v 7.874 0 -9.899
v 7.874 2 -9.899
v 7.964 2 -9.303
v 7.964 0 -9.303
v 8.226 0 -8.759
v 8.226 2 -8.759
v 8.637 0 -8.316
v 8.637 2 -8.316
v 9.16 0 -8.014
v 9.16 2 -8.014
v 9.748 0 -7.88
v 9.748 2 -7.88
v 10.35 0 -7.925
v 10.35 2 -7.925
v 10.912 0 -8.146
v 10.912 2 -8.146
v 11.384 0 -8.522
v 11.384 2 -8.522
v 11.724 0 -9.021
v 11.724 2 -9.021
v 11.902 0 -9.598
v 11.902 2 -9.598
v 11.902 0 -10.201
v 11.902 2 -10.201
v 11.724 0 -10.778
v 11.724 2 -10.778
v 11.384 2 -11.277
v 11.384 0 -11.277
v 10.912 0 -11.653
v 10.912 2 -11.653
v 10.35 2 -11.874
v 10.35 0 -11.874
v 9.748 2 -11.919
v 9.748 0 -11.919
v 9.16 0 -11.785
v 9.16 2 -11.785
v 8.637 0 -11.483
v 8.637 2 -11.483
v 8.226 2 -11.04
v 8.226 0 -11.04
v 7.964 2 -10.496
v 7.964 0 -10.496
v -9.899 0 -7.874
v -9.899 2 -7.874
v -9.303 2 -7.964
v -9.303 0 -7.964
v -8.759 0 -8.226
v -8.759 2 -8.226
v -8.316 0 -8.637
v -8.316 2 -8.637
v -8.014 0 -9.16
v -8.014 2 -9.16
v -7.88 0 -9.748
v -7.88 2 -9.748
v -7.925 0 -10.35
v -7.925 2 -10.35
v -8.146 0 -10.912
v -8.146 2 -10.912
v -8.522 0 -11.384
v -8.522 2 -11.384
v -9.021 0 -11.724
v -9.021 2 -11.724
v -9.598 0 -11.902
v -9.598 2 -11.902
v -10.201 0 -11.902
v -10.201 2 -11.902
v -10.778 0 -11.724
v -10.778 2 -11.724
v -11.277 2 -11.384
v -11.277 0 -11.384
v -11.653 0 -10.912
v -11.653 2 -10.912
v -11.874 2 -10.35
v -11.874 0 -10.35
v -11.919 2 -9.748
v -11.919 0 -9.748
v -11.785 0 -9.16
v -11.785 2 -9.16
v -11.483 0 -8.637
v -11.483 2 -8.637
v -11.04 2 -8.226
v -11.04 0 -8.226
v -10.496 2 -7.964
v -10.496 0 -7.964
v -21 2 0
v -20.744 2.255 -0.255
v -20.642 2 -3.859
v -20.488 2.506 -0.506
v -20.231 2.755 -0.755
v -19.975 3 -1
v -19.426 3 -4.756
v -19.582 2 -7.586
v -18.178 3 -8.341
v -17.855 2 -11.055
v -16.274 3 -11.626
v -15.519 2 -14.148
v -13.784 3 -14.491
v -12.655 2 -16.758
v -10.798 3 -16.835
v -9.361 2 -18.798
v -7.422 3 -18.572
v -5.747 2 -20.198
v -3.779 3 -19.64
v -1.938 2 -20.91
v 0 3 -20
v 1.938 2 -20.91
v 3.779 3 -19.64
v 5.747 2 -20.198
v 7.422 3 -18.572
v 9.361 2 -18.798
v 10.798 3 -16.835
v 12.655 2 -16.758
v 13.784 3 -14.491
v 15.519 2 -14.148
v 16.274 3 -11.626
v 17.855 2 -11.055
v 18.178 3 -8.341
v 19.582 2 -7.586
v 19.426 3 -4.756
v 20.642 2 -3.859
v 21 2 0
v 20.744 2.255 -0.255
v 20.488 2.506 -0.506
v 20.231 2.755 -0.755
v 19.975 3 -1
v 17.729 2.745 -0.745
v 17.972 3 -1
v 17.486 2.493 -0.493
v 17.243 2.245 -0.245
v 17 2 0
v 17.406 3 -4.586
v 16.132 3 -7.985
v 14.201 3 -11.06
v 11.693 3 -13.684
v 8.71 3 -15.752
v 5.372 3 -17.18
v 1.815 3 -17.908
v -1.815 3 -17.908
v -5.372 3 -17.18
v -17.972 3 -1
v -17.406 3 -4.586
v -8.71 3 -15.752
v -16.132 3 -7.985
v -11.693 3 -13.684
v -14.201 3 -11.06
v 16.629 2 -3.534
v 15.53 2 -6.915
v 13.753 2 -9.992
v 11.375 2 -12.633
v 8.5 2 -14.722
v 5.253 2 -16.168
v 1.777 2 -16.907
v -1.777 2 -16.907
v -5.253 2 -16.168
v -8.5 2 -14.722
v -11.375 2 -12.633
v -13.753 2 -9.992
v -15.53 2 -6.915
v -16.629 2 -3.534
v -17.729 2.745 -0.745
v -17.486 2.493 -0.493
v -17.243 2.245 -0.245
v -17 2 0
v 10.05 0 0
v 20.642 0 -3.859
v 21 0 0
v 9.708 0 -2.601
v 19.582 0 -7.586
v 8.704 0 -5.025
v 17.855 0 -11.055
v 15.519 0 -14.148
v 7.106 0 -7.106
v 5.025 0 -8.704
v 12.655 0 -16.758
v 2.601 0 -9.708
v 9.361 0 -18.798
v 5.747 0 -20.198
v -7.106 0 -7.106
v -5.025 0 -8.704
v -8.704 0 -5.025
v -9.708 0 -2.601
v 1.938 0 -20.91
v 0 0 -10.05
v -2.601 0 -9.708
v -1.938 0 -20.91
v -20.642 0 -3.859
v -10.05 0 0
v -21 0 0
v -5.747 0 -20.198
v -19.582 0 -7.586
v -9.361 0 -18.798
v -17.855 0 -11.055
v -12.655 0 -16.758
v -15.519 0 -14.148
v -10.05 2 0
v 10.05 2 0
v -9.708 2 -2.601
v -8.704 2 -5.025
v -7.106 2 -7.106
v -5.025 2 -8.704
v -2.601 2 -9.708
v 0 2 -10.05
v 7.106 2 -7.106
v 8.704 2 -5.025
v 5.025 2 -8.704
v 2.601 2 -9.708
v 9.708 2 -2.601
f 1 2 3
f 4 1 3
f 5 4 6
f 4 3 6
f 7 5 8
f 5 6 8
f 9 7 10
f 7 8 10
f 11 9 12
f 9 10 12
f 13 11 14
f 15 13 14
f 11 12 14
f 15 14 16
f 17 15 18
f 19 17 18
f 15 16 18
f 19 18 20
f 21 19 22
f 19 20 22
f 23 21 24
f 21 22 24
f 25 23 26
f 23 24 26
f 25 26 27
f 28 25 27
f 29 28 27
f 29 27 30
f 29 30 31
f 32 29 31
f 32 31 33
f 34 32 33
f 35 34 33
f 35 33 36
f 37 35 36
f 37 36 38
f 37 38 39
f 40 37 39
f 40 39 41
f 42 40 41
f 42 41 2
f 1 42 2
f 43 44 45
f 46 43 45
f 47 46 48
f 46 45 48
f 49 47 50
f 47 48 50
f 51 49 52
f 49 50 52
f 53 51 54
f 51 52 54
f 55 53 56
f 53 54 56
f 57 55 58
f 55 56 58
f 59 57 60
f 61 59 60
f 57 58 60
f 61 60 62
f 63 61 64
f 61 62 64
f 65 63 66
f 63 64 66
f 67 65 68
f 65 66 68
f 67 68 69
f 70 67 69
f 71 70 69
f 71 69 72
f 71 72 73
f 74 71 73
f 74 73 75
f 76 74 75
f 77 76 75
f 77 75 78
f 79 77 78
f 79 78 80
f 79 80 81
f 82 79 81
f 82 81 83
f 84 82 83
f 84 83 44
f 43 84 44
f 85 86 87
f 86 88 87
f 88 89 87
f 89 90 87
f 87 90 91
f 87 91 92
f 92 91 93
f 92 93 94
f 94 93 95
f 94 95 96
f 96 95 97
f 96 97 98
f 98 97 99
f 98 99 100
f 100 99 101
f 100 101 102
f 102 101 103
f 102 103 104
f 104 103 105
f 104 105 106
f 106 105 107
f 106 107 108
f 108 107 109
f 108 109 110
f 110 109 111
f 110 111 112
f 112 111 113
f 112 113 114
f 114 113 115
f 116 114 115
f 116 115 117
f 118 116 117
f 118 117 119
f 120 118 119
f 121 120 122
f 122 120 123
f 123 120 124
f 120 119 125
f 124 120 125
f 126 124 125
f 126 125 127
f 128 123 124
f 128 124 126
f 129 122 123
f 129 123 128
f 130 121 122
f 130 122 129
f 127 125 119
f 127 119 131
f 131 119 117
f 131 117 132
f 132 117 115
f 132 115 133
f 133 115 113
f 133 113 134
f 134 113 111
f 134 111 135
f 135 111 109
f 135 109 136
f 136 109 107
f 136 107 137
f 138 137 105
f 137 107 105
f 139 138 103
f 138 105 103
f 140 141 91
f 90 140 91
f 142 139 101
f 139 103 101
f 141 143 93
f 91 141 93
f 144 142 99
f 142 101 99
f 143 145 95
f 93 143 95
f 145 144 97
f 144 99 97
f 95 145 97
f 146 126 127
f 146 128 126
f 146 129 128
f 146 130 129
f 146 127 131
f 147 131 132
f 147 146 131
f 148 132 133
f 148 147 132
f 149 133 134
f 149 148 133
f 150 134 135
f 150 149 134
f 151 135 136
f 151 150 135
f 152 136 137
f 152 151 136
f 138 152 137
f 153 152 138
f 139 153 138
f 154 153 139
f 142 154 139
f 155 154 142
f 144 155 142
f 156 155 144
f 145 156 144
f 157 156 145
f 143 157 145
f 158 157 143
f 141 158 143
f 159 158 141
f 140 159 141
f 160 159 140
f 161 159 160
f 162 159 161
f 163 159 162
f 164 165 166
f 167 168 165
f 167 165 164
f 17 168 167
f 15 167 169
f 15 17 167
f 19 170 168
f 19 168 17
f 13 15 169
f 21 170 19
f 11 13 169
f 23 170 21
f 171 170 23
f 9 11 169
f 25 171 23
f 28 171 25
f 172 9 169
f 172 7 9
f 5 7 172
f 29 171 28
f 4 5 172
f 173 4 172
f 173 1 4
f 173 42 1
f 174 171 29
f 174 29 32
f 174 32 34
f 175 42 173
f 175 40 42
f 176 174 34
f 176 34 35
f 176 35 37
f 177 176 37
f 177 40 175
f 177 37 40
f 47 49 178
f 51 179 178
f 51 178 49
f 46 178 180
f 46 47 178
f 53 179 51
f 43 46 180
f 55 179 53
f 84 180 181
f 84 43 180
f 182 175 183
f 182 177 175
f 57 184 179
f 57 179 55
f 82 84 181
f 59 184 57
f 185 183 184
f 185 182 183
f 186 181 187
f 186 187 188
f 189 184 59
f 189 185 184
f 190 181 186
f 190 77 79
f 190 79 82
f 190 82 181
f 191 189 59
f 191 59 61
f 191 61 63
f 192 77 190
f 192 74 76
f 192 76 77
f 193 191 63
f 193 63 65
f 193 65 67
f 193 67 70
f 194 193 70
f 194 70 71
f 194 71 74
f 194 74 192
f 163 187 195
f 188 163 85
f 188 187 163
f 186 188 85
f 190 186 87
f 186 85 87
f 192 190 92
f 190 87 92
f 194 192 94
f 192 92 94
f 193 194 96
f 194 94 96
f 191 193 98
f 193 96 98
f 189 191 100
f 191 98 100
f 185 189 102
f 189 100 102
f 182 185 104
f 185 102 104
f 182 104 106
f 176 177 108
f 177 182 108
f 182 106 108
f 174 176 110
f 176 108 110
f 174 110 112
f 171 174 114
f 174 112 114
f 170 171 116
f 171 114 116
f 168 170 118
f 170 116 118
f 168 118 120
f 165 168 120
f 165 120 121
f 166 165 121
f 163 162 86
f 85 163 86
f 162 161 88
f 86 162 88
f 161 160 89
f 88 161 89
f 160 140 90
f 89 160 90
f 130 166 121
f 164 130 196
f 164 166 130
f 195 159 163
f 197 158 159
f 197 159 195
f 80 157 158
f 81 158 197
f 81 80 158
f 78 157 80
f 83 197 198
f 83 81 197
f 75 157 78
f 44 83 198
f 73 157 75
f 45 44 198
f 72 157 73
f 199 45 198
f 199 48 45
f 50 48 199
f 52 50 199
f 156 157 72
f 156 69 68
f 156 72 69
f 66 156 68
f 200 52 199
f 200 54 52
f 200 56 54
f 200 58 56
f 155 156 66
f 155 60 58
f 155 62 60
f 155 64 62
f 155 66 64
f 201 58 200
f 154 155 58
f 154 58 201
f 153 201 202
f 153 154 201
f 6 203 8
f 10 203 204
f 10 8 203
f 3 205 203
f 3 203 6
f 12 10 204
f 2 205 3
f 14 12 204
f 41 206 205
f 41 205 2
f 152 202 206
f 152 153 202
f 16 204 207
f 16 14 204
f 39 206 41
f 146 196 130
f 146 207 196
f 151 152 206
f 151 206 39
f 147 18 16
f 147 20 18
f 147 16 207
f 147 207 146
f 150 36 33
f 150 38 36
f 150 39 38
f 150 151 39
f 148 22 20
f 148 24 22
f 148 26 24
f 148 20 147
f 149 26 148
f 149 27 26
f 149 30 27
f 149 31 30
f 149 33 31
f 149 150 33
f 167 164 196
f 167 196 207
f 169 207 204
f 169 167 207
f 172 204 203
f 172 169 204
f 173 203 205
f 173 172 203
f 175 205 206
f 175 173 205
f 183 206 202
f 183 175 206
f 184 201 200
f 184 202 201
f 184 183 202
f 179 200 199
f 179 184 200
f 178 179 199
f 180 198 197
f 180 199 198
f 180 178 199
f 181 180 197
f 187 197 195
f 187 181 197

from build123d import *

# Parameters (mm, degrees)
EXTRUDE_1_DEPTH               = 3
HOLE_WIZARD_M2_1_AT_2_COUNT   = 2
HOLE_WIZARD_M2_1_AT_2_PITCH   = 21
PATTERN_LINEAR_1_COUNT        = 3
PATTERN_LINEAR_1_PITCH        = 33
PATTERN_LINEAR_2_COUNT        = 3
PATTERN_LINEAR_2_PITCH        = 10.5
PATTERN_LINEAR_3_COUNT        = 2
PATTERN_LINEAR_3_PITCH        = 31.5
HOLE_WIZARD_M2_1_2_AT_2_COUNT = 2
HOLE_WIZARD_M2_1_2_AT_2_PITCH = 16.970562748
SKETCH_8_R                    = 17
CUT_EXTRUDE_1_DEPTH           = 1
SKETCH_9_R                    = 2.025
CUT_EXTRUDE_2_DEPTH           = 75.994999833
PATTERN_CIRCULAR_1_COUNT      = 2
PATTERN_CIRCULAR_1_ANGLE      = 90
FILLET_1_R                    = 4
CUT_EXTRUDE_3_DEPTH           = 76.028327984
CHAMFER_2_SIZE                = 1


with BuildPart() as part:
    # ｽｹｯﾁ1 → ﾎﾞｽ - 押し出し1 (new body)
    with BuildSketch(Plane(origin=(0, 0, 0), x_dir=(1, 0, 0), z_dir=(0, 1, 0))):
        with BuildLine():
            Line((-10.05, 0), (-39, 0))
            Line((-39, 0), (-47.5, 8.5))
            Line((-47.5, 8.5), (-47.5, 58))
            Line((-47.5, 58), (47.5, 58))
            Line((47.5, 58), (47.5, 8.5))
            Line((47.5, 8.5), (39, 0))
            Line((39, 0), (10.05, 0))
            ThreePointArc((10.05, 0), (0, 10.05), (-10.05, 0))
        make_face()
    extrude(amount=EXTRUDE_1_DEPTH)

    # ｽｹｯﾁ3 → Hole Wizard M2 _1 (revolve, cut)
    with BuildSketch(Plane(origin=(-43.5, 3, -54), x_dir=(0, 0, 1), z_dir=(1, 0, 0))):
        Polygon((0, 0), (0, 4.63090365), (1.05, 4), (1.05, 1), (2, 1), (2, 0), align=None)
    hole_wizard_m2_1 = revolve(axis=Axis((-43.5, 9.35, -54), (0, -1, 0)), mode=Mode.SUBTRACT)

    # Hole Wizard M2 _1 at 2: Hole Wizard M2 _1 ×2
    with Locations(*[(i * HOLE_WIZARD_M2_1_AT_2_PITCH, 0, 0) for i in range(1, HOLE_WIZARD_M2_1_AT_2_COUNT)]):
        add(hole_wizard_m2_1, mode=Mode.SUBTRACT)

    # 直線ﾊﾟﾀｰﾝ1: Hole Wizard M2 _1 ×3
    with Locations(*[(i * PATTERN_LINEAR_1_PITCH, 0, 0) for i in range(1, PATTERN_LINEAR_1_COUNT)]):
        add(hole_wizard_m2_1, mode=Mode.SUBTRACT)

    # 直線ﾊﾟﾀｰﾝ1 copy 1 sketch → 直線ﾊﾟﾀｰﾝ1 copy 1 (revolve, cut)
    with BuildSketch(Plane(origin=(10.5, 3, -54), x_dir=(0, 0, 1), z_dir=(1, 0, 0))):
        Polygon((0, 0), (0, 4.63090365), (1.05, 4), (1.05, 1), (2, 1), (2, 0), align=None)
    revolve(axis=Axis((10.5, 9.35, -54), (0, -1, 0)), mode=Mode.SUBTRACT)

    # 直線ﾊﾟﾀｰﾝ1 copy 2 sketch → 直線ﾊﾟﾀｰﾝ1 copy 2 (revolve, cut)
    with BuildSketch(Plane(origin=(43.5, 3, -54), x_dir=(0, 0, 1), z_dir=(1, 0, 0))):
        Polygon((0, 0), (0, 4.63090365), (1.05, 4), (1.05, 1), (2, 1), (2, 0), align=None)
    revolve(axis=Axis((43.5, 9.35, -54), (0, -1, 0)), mode=Mode.SUBTRACT)

    # 直線ﾊﾟﾀｰﾝ2: Hole Wizard M2 _1 ×3
    with Locations(*[(0, 0, i * PATTERN_LINEAR_2_PITCH) for i in range(1, PATTERN_LINEAR_2_COUNT)]):
        add(hole_wizard_m2_1, mode=Mode.SUBTRACT)

    # 直線ﾊﾟﾀｰﾝ2 copy 1 sketch → 直線ﾊﾟﾀｰﾝ2 copy 1 (revolve, cut)
    with BuildSketch(Plane(origin=(-22.5, 3, -43.5), x_dir=(0, 0, 1), z_dir=(1, 0, 0))):
        Polygon((0, 0), (0, 4.63090365), (1.05, 4), (1.05, 1), (2, 1), (2, 0), align=None)
    revolve(axis=Axis((-22.5, 9.35, -43.5), (0, -1, 0)), mode=Mode.SUBTRACT)

    # 直線ﾊﾟﾀｰﾝ2 copy 2 sketch → 直線ﾊﾟﾀｰﾝ2 copy 2 (revolve, cut)
    with BuildSketch(Plane(origin=(-22.5, 3, -33), x_dir=(0, 0, 1), z_dir=(1, 0, 0))):
        Polygon((0, 0), (0, 4.63090365), (1.05, 4), (1.05, 1), (2, 1), (2, 0), align=None)
    revolve(axis=Axis((-22.5, 9.35, -33), (0, -1, 0)), mode=Mode.SUBTRACT)

    # 直線ﾊﾟﾀｰﾝ2 copy 3 sketch → 直線ﾊﾟﾀｰﾝ2 copy 3 (revolve, cut)
    with BuildSketch(Plane(origin=(-10.5, 3, -43.5), x_dir=(0, 0, 1), z_dir=(1, 0, 0))):
        Polygon((0, 0), (0, 4.63090365), (1.05, 4), (1.05, 1), (2, 1), (2, 0), align=None)
    revolve(axis=Axis((-10.5, 9.35, -43.5), (0, -1, 0)), mode=Mode.SUBTRACT)

    # 直線ﾊﾟﾀｰﾝ2 copy 4 sketch → 直線ﾊﾟﾀｰﾝ2 copy 4 (revolve, cut)
    with BuildSketch(Plane(origin=(-10.5, 3, -33), x_dir=(0, 0, 1), z_dir=(1, 0, 0))):
        Polygon((0, 0), (0, 4.63090365), (1.05, 4), (1.05, 1), (2, 1), (2, 0), align=None)
    revolve(axis=Axis((-10.5, 9.35, -33), (0, -1, 0)), mode=Mode.SUBTRACT)

    # 直線ﾊﾟﾀｰﾝ2 copy 5 sketch → 直線ﾊﾟﾀｰﾝ2 copy 5 (revolve, cut)
    with BuildSketch(Plane(origin=(22.5, 3, -43.5), x_dir=(0, 0, 1), z_dir=(1, 0, 0))):
        Polygon((0, 0), (0, 4.63090365), (1.05, 4), (1.05, 1), (2, 1), (2, 0), align=None)
    revolve(axis=Axis((22.5, 9.35, -43.5), (0, -1, 0)), mode=Mode.SUBTRACT)

    # 直線ﾊﾟﾀｰﾝ2 copy 6 sketch → 直線ﾊﾟﾀｰﾝ2 copy 6 (revolve, cut)
    with BuildSketch(Plane(origin=(22.5, 3, -33), x_dir=(0, 0, 1), z_dir=(1, 0, 0))):
        Polygon((0, 0), (0, 4.63090365), (1.05, 4), (1.05, 1), (2, 1), (2, 0), align=None)
    revolve(axis=Axis((22.5, 9.35, -33), (0, -1, 0)), mode=Mode.SUBTRACT)

    # 直線ﾊﾟﾀｰﾝ2 copy 7 sketch → 直線ﾊﾟﾀｰﾝ2 copy 7 (revolve, cut)
    with BuildSketch(Plane(origin=(10.5, 3, -43.5), x_dir=(0, 0, 1), z_dir=(1, 0, 0))):
        Polygon((0, 0), (0, 4.63090365), (1.05, 4), (1.05, 1), (2, 1), (2, 0), align=None)
    revolve(axis=Axis((10.5, 9.35, -43.5), (0, -1, 0)), mode=Mode.SUBTRACT)

    # 直線ﾊﾟﾀｰﾝ2 copy 8 sketch → 直線ﾊﾟﾀｰﾝ2 copy 8 (revolve, cut)
    with BuildSketch(Plane(origin=(10.5, 3, -33), x_dir=(0, 0, 1), z_dir=(1, 0, 0))):
        Polygon((0, 0), (0, 4.63090365), (1.05, 4), (1.05, 1), (2, 1), (2, 0), align=None)
    revolve(axis=Axis((10.5, 9.35, -33), (0, -1, 0)), mode=Mode.SUBTRACT)

    # 直線ﾊﾟﾀｰﾝ2 copy 9 sketch → 直線ﾊﾟﾀｰﾝ2 copy 9 (revolve, cut)
    with BuildSketch(Plane(origin=(43.5, 3, -43.5), x_dir=(0, 0, 1), z_dir=(1, 0, 0))):
        Polygon((0, 0), (0, 4.63090365), (1.05, 4), (1.05, 1), (2, 1), (2, 0), align=None)
    revolve(axis=Axis((43.5, 9.35, -43.5), (0, -1, 0)), mode=Mode.SUBTRACT)

    # 直線ﾊﾟﾀｰﾝ2 copy 10 sketch → 直線ﾊﾟﾀｰﾝ2 copy 10 (revolve, cut)
    with BuildSketch(Plane(origin=(43.5, 3, -33), x_dir=(0, 0, 1), z_dir=(1, 0, 0))):
        Polygon((0, 0), (0, 4.63090365), (1.05, 4), (1.05, 1), (2, 1), (2, 0), align=None)
    revolve(axis=Axis((43.5, 9.35, -33), (0, -1, 0)), mode=Mode.SUBTRACT)

    # 直線ﾊﾟﾀｰﾝ3: Hole Wizard M2 _1 ×2
    with Locations(*[(0, 0, i * PATTERN_LINEAR_3_PITCH) for i in range(1, PATTERN_LINEAR_3_COUNT)]):
        add(hole_wizard_m2_1, mode=Mode.SUBTRACT)

    # 直線ﾊﾟﾀｰﾝ3 copy 1 sketch → 直線ﾊﾟﾀｰﾝ3 copy 1 (revolve, cut)
    with BuildSketch(Plane(origin=(-22.5, 3, -22.5), x_dir=(0, 0, 1), z_dir=(1, 0, 0))):
        Polygon((0, 0), (0, 4.63090365), (1.05, 4), (1.05, 1), (2, 1), (2, 0), align=None)
    revolve(axis=Axis((-22.5, 9.35, -22.5), (0, -1, 0)), mode=Mode.SUBTRACT)

    # ｽｹｯﾁ5 → Hole Wizard M2 _1 2 (revolve, cut)
    with BuildSketch(Plane(origin=(-10.5, 3, -22.5), x_dir=(0, 0, 1), z_dir=(1, 0, 0))):
        Polygon((0, 0), (0, 6.480688495), (0.8, 6), (0.8, 0), align=None)
    hole_wizard_m2_1_2 = revolve(axis=Axis((-10.5, 9.35, -22.5), (0, -1, 0)), mode=Mode.SUBTRACT)

    # Hole Wizard M2 _1 2 at 2: Hole Wizard M2 _1 2 ×2
    with Locations(*[Vector(-0.7071067811865469, 0, 0.7071067811865482) * (i * HOLE_WIZARD_M2_1_2_AT_2_PITCH) for i in range(1, HOLE_WIZARD_M2_1_2_AT_2_COUNT)]):
        add(hole_wizard_m2_1_2, mode=Mode.SUBTRACT)

    # ｽｹｯﾁ7 → M2 なべ頭ねじ用座ぐり穴2 (revolve, cut)
    with BuildSketch(Plane(origin=(-43.5, 3, -12), x_dir=(0, 0, 1), z_dir=(1, 0, 0))):
        Polygon((0, 0), (0, 6.63090365), (1.05, 6), (1.05, 1), (2, 1), (2, 0), align=None)
    hole_wizard_m2_2 = revolve(axis=Axis((-43.5, 9.35, -12), (0, -1, 0)), mode=Mode.SUBTRACT)

    # ﾐﾗｰ1: Hole Wizard M2 _1 2, M2 なべ頭ねじ用座ぐり穴2 across plane
    add(hole_wizard_m2_1_2.mirror(Plane(origin=(0, 0, 0), x_dir=(0, 0, 1), z_dir=(1, 0, 0))), mode=Mode.SUBTRACT)
    add(hole_wizard_m2_2.mirror(Plane(origin=(0, 0, 0), x_dir=(0, 0, 1), z_dir=(1, 0, 0))), mode=Mode.SUBTRACT)

    # ﾐﾗｰ1 copy 1 sketch → ﾐﾗｰ1 copy 1 (revolve, cut)
    with BuildSketch(Plane(origin=(43.5, 3, -22.5), x_dir=(0, 0, 1), z_dir=(-1, 0, 0))):
        Polygon((0, 0), (0, -4.63090365), (1.05, -4), (1.05, -1), (2, -1), (2, 0), align=None)
    revolve(axis=Axis((43.5, 9.35, -22.5), (0, 1, 0)), mode=Mode.SUBTRACT)

    # ﾐﾗｰ1 copy 2 sketch → ﾐﾗｰ1 copy 2 (revolve, cut)
    with BuildSketch(Plane(origin=(22.5, 3, -22.5), x_dir=(0, 0, 1), z_dir=(-1, 0, 0))):
        Polygon((0, 0), (0, -4.63090365), (1.05, -4), (1.05, -1), (2, -1), (2, 0), align=None)
    revolve(axis=Axis((22.5, 9.35, -22.5), (0, 1, 0)), mode=Mode.SUBTRACT)

    # ﾐﾗｰ1 copy 3 sketch → ﾐﾗｰ1 copy 3 (revolve, cut)
    with BuildSketch(Plane(origin=(43.5, 3, -54), x_dir=(0, 0, 1), z_dir=(-1, 0, 0))):
        Polygon((0, 0), (0, -4.63090365), (1.05, -4), (1.05, -1), (2, -1), (2, 0), align=None)
    revolve(axis=Axis((43.5, 9.35, -54), (0, 1, 0)), mode=Mode.SUBTRACT)

    # ﾐﾗｰ1 copy 4 sketch → ﾐﾗｰ1 copy 4 (revolve, cut)
    with BuildSketch(Plane(origin=(22.5, 3, -54), x_dir=(0, 0, 1), z_dir=(-1, 0, 0))):
        Polygon((0, 0), (0, -4.63090365), (1.05, -4), (1.05, -1), (2, -1), (2, 0), align=None)
    revolve(axis=Axis((22.5, 9.35, -54), (0, 1, 0)), mode=Mode.SUBTRACT)

    # ﾐﾗｰ1 copy 5 sketch → ﾐﾗｰ1 copy 5 (revolve, cut)
    with BuildSketch(Plane(origin=(22.5, 3, -10.5), x_dir=(0, 0, 1), z_dir=(-1, 0, 0))):
        Polygon((0, 0), (0, -6.480688495), (0.8, -6), (0.8, 0), align=None)
    revolve(axis=Axis((22.5, 9.35, -10.5), (0, 1, 0)), mode=Mode.SUBTRACT)

    # ｽｹｯﾁ8 → ｶｯﾄ - 押し出し1 (cut)
    with BuildSketch(Plane(origin=(0, 3, 0), x_dir=(1, 0, 0), z_dir=(0, 1, 0))):
        Circle(SKETCH_8_R)
    extrude(amount=-CUT_EXTRUDE_1_DEPTH, mode=Mode.SUBTRACT)

    # ｽｹｯﾁ9 → ｶｯﾄ - 押し出し2 (cut, through all)
    with BuildSketch(Plane(origin=(0, 2, 0), x_dir=(1, 0, 0), z_dir=(0, 1, 0))):
        with Locations(Location((-9.899494937, 9.899494937, 0), (0, 0, 270))):
            Circle(SKETCH_9_R)
    cut_extrude_2 = extrude(amount=-CUT_EXTRUDE_2_DEPTH, mode=Mode.SUBTRACT)

    # 円形ﾊﾟﾀｰﾝ1: ｶｯﾄ - 押し出し2 ×2 about axis
    pattern_circular_1_axis = Axis((0, 3, 0), (0, -1, 0))
    for i in range(1, PATTERN_CIRCULAR_1_COUNT):
        add(cut_extrude_2.rotate(pattern_circular_1_axis, i * PATTERN_CIRCULAR_1_ANGLE / (PATTERN_CIRCULAR_1_COUNT - 1)), mode=Mode.SUBTRACT)

    # ﾌｨﾚｯﾄ1
    fillet_1_edges = [part.edges().sort_by_distance(p)[0] for p in [
        (-47.5, 1.5, -8.5),
        (-47.5, 1.5, -58),
        (47.5, 1.5, -58),
        (47.5, 1.5, -8.5),
        (39, 1.5, 0),
        (-39, 1.5, 0),
    ]]
    fillet(fillet_1_edges, radius=FILLET_1_R)

    # ｽｹｯﾁ10 → ｶｯﾄ - 押し出し3 (cut, through all)
    with BuildSketch(Plane(origin=(0, 3, 0), x_dir=(1, 0, 0), z_dir=(0, 1, 0))):
        with BuildLine():
            Line((-47.5, 0), (-21, 0))
            ThreePointArc((-21, 0), (0, 21), (21, 0))
            Line((21, 0), (47.5, 0))
            Line((47.5, 0), (47.5, 58))
            Line((47.5, 58), (-47.5, 58))
            Line((-47.5, 58), (-47.5, 0))
        make_face()
    extrude(amount=-CUT_EXTRUDE_3_DEPTH, mode=Mode.SUBTRACT)

    # 面取り2
    chamfer_2_edges = [part.edges().sort_by_distance(p)[0] for p in [
        (19, 3, 0),
        (0, 3, -17),
        (-19, 3, 0),
        (0, 3, -21),
    ]]
    chamfer(chamfer_2_edges, length=CHAMFER_2_SIZE - 0.0001)  # a hair under: the kernel refuses the full size


solid = part.part
